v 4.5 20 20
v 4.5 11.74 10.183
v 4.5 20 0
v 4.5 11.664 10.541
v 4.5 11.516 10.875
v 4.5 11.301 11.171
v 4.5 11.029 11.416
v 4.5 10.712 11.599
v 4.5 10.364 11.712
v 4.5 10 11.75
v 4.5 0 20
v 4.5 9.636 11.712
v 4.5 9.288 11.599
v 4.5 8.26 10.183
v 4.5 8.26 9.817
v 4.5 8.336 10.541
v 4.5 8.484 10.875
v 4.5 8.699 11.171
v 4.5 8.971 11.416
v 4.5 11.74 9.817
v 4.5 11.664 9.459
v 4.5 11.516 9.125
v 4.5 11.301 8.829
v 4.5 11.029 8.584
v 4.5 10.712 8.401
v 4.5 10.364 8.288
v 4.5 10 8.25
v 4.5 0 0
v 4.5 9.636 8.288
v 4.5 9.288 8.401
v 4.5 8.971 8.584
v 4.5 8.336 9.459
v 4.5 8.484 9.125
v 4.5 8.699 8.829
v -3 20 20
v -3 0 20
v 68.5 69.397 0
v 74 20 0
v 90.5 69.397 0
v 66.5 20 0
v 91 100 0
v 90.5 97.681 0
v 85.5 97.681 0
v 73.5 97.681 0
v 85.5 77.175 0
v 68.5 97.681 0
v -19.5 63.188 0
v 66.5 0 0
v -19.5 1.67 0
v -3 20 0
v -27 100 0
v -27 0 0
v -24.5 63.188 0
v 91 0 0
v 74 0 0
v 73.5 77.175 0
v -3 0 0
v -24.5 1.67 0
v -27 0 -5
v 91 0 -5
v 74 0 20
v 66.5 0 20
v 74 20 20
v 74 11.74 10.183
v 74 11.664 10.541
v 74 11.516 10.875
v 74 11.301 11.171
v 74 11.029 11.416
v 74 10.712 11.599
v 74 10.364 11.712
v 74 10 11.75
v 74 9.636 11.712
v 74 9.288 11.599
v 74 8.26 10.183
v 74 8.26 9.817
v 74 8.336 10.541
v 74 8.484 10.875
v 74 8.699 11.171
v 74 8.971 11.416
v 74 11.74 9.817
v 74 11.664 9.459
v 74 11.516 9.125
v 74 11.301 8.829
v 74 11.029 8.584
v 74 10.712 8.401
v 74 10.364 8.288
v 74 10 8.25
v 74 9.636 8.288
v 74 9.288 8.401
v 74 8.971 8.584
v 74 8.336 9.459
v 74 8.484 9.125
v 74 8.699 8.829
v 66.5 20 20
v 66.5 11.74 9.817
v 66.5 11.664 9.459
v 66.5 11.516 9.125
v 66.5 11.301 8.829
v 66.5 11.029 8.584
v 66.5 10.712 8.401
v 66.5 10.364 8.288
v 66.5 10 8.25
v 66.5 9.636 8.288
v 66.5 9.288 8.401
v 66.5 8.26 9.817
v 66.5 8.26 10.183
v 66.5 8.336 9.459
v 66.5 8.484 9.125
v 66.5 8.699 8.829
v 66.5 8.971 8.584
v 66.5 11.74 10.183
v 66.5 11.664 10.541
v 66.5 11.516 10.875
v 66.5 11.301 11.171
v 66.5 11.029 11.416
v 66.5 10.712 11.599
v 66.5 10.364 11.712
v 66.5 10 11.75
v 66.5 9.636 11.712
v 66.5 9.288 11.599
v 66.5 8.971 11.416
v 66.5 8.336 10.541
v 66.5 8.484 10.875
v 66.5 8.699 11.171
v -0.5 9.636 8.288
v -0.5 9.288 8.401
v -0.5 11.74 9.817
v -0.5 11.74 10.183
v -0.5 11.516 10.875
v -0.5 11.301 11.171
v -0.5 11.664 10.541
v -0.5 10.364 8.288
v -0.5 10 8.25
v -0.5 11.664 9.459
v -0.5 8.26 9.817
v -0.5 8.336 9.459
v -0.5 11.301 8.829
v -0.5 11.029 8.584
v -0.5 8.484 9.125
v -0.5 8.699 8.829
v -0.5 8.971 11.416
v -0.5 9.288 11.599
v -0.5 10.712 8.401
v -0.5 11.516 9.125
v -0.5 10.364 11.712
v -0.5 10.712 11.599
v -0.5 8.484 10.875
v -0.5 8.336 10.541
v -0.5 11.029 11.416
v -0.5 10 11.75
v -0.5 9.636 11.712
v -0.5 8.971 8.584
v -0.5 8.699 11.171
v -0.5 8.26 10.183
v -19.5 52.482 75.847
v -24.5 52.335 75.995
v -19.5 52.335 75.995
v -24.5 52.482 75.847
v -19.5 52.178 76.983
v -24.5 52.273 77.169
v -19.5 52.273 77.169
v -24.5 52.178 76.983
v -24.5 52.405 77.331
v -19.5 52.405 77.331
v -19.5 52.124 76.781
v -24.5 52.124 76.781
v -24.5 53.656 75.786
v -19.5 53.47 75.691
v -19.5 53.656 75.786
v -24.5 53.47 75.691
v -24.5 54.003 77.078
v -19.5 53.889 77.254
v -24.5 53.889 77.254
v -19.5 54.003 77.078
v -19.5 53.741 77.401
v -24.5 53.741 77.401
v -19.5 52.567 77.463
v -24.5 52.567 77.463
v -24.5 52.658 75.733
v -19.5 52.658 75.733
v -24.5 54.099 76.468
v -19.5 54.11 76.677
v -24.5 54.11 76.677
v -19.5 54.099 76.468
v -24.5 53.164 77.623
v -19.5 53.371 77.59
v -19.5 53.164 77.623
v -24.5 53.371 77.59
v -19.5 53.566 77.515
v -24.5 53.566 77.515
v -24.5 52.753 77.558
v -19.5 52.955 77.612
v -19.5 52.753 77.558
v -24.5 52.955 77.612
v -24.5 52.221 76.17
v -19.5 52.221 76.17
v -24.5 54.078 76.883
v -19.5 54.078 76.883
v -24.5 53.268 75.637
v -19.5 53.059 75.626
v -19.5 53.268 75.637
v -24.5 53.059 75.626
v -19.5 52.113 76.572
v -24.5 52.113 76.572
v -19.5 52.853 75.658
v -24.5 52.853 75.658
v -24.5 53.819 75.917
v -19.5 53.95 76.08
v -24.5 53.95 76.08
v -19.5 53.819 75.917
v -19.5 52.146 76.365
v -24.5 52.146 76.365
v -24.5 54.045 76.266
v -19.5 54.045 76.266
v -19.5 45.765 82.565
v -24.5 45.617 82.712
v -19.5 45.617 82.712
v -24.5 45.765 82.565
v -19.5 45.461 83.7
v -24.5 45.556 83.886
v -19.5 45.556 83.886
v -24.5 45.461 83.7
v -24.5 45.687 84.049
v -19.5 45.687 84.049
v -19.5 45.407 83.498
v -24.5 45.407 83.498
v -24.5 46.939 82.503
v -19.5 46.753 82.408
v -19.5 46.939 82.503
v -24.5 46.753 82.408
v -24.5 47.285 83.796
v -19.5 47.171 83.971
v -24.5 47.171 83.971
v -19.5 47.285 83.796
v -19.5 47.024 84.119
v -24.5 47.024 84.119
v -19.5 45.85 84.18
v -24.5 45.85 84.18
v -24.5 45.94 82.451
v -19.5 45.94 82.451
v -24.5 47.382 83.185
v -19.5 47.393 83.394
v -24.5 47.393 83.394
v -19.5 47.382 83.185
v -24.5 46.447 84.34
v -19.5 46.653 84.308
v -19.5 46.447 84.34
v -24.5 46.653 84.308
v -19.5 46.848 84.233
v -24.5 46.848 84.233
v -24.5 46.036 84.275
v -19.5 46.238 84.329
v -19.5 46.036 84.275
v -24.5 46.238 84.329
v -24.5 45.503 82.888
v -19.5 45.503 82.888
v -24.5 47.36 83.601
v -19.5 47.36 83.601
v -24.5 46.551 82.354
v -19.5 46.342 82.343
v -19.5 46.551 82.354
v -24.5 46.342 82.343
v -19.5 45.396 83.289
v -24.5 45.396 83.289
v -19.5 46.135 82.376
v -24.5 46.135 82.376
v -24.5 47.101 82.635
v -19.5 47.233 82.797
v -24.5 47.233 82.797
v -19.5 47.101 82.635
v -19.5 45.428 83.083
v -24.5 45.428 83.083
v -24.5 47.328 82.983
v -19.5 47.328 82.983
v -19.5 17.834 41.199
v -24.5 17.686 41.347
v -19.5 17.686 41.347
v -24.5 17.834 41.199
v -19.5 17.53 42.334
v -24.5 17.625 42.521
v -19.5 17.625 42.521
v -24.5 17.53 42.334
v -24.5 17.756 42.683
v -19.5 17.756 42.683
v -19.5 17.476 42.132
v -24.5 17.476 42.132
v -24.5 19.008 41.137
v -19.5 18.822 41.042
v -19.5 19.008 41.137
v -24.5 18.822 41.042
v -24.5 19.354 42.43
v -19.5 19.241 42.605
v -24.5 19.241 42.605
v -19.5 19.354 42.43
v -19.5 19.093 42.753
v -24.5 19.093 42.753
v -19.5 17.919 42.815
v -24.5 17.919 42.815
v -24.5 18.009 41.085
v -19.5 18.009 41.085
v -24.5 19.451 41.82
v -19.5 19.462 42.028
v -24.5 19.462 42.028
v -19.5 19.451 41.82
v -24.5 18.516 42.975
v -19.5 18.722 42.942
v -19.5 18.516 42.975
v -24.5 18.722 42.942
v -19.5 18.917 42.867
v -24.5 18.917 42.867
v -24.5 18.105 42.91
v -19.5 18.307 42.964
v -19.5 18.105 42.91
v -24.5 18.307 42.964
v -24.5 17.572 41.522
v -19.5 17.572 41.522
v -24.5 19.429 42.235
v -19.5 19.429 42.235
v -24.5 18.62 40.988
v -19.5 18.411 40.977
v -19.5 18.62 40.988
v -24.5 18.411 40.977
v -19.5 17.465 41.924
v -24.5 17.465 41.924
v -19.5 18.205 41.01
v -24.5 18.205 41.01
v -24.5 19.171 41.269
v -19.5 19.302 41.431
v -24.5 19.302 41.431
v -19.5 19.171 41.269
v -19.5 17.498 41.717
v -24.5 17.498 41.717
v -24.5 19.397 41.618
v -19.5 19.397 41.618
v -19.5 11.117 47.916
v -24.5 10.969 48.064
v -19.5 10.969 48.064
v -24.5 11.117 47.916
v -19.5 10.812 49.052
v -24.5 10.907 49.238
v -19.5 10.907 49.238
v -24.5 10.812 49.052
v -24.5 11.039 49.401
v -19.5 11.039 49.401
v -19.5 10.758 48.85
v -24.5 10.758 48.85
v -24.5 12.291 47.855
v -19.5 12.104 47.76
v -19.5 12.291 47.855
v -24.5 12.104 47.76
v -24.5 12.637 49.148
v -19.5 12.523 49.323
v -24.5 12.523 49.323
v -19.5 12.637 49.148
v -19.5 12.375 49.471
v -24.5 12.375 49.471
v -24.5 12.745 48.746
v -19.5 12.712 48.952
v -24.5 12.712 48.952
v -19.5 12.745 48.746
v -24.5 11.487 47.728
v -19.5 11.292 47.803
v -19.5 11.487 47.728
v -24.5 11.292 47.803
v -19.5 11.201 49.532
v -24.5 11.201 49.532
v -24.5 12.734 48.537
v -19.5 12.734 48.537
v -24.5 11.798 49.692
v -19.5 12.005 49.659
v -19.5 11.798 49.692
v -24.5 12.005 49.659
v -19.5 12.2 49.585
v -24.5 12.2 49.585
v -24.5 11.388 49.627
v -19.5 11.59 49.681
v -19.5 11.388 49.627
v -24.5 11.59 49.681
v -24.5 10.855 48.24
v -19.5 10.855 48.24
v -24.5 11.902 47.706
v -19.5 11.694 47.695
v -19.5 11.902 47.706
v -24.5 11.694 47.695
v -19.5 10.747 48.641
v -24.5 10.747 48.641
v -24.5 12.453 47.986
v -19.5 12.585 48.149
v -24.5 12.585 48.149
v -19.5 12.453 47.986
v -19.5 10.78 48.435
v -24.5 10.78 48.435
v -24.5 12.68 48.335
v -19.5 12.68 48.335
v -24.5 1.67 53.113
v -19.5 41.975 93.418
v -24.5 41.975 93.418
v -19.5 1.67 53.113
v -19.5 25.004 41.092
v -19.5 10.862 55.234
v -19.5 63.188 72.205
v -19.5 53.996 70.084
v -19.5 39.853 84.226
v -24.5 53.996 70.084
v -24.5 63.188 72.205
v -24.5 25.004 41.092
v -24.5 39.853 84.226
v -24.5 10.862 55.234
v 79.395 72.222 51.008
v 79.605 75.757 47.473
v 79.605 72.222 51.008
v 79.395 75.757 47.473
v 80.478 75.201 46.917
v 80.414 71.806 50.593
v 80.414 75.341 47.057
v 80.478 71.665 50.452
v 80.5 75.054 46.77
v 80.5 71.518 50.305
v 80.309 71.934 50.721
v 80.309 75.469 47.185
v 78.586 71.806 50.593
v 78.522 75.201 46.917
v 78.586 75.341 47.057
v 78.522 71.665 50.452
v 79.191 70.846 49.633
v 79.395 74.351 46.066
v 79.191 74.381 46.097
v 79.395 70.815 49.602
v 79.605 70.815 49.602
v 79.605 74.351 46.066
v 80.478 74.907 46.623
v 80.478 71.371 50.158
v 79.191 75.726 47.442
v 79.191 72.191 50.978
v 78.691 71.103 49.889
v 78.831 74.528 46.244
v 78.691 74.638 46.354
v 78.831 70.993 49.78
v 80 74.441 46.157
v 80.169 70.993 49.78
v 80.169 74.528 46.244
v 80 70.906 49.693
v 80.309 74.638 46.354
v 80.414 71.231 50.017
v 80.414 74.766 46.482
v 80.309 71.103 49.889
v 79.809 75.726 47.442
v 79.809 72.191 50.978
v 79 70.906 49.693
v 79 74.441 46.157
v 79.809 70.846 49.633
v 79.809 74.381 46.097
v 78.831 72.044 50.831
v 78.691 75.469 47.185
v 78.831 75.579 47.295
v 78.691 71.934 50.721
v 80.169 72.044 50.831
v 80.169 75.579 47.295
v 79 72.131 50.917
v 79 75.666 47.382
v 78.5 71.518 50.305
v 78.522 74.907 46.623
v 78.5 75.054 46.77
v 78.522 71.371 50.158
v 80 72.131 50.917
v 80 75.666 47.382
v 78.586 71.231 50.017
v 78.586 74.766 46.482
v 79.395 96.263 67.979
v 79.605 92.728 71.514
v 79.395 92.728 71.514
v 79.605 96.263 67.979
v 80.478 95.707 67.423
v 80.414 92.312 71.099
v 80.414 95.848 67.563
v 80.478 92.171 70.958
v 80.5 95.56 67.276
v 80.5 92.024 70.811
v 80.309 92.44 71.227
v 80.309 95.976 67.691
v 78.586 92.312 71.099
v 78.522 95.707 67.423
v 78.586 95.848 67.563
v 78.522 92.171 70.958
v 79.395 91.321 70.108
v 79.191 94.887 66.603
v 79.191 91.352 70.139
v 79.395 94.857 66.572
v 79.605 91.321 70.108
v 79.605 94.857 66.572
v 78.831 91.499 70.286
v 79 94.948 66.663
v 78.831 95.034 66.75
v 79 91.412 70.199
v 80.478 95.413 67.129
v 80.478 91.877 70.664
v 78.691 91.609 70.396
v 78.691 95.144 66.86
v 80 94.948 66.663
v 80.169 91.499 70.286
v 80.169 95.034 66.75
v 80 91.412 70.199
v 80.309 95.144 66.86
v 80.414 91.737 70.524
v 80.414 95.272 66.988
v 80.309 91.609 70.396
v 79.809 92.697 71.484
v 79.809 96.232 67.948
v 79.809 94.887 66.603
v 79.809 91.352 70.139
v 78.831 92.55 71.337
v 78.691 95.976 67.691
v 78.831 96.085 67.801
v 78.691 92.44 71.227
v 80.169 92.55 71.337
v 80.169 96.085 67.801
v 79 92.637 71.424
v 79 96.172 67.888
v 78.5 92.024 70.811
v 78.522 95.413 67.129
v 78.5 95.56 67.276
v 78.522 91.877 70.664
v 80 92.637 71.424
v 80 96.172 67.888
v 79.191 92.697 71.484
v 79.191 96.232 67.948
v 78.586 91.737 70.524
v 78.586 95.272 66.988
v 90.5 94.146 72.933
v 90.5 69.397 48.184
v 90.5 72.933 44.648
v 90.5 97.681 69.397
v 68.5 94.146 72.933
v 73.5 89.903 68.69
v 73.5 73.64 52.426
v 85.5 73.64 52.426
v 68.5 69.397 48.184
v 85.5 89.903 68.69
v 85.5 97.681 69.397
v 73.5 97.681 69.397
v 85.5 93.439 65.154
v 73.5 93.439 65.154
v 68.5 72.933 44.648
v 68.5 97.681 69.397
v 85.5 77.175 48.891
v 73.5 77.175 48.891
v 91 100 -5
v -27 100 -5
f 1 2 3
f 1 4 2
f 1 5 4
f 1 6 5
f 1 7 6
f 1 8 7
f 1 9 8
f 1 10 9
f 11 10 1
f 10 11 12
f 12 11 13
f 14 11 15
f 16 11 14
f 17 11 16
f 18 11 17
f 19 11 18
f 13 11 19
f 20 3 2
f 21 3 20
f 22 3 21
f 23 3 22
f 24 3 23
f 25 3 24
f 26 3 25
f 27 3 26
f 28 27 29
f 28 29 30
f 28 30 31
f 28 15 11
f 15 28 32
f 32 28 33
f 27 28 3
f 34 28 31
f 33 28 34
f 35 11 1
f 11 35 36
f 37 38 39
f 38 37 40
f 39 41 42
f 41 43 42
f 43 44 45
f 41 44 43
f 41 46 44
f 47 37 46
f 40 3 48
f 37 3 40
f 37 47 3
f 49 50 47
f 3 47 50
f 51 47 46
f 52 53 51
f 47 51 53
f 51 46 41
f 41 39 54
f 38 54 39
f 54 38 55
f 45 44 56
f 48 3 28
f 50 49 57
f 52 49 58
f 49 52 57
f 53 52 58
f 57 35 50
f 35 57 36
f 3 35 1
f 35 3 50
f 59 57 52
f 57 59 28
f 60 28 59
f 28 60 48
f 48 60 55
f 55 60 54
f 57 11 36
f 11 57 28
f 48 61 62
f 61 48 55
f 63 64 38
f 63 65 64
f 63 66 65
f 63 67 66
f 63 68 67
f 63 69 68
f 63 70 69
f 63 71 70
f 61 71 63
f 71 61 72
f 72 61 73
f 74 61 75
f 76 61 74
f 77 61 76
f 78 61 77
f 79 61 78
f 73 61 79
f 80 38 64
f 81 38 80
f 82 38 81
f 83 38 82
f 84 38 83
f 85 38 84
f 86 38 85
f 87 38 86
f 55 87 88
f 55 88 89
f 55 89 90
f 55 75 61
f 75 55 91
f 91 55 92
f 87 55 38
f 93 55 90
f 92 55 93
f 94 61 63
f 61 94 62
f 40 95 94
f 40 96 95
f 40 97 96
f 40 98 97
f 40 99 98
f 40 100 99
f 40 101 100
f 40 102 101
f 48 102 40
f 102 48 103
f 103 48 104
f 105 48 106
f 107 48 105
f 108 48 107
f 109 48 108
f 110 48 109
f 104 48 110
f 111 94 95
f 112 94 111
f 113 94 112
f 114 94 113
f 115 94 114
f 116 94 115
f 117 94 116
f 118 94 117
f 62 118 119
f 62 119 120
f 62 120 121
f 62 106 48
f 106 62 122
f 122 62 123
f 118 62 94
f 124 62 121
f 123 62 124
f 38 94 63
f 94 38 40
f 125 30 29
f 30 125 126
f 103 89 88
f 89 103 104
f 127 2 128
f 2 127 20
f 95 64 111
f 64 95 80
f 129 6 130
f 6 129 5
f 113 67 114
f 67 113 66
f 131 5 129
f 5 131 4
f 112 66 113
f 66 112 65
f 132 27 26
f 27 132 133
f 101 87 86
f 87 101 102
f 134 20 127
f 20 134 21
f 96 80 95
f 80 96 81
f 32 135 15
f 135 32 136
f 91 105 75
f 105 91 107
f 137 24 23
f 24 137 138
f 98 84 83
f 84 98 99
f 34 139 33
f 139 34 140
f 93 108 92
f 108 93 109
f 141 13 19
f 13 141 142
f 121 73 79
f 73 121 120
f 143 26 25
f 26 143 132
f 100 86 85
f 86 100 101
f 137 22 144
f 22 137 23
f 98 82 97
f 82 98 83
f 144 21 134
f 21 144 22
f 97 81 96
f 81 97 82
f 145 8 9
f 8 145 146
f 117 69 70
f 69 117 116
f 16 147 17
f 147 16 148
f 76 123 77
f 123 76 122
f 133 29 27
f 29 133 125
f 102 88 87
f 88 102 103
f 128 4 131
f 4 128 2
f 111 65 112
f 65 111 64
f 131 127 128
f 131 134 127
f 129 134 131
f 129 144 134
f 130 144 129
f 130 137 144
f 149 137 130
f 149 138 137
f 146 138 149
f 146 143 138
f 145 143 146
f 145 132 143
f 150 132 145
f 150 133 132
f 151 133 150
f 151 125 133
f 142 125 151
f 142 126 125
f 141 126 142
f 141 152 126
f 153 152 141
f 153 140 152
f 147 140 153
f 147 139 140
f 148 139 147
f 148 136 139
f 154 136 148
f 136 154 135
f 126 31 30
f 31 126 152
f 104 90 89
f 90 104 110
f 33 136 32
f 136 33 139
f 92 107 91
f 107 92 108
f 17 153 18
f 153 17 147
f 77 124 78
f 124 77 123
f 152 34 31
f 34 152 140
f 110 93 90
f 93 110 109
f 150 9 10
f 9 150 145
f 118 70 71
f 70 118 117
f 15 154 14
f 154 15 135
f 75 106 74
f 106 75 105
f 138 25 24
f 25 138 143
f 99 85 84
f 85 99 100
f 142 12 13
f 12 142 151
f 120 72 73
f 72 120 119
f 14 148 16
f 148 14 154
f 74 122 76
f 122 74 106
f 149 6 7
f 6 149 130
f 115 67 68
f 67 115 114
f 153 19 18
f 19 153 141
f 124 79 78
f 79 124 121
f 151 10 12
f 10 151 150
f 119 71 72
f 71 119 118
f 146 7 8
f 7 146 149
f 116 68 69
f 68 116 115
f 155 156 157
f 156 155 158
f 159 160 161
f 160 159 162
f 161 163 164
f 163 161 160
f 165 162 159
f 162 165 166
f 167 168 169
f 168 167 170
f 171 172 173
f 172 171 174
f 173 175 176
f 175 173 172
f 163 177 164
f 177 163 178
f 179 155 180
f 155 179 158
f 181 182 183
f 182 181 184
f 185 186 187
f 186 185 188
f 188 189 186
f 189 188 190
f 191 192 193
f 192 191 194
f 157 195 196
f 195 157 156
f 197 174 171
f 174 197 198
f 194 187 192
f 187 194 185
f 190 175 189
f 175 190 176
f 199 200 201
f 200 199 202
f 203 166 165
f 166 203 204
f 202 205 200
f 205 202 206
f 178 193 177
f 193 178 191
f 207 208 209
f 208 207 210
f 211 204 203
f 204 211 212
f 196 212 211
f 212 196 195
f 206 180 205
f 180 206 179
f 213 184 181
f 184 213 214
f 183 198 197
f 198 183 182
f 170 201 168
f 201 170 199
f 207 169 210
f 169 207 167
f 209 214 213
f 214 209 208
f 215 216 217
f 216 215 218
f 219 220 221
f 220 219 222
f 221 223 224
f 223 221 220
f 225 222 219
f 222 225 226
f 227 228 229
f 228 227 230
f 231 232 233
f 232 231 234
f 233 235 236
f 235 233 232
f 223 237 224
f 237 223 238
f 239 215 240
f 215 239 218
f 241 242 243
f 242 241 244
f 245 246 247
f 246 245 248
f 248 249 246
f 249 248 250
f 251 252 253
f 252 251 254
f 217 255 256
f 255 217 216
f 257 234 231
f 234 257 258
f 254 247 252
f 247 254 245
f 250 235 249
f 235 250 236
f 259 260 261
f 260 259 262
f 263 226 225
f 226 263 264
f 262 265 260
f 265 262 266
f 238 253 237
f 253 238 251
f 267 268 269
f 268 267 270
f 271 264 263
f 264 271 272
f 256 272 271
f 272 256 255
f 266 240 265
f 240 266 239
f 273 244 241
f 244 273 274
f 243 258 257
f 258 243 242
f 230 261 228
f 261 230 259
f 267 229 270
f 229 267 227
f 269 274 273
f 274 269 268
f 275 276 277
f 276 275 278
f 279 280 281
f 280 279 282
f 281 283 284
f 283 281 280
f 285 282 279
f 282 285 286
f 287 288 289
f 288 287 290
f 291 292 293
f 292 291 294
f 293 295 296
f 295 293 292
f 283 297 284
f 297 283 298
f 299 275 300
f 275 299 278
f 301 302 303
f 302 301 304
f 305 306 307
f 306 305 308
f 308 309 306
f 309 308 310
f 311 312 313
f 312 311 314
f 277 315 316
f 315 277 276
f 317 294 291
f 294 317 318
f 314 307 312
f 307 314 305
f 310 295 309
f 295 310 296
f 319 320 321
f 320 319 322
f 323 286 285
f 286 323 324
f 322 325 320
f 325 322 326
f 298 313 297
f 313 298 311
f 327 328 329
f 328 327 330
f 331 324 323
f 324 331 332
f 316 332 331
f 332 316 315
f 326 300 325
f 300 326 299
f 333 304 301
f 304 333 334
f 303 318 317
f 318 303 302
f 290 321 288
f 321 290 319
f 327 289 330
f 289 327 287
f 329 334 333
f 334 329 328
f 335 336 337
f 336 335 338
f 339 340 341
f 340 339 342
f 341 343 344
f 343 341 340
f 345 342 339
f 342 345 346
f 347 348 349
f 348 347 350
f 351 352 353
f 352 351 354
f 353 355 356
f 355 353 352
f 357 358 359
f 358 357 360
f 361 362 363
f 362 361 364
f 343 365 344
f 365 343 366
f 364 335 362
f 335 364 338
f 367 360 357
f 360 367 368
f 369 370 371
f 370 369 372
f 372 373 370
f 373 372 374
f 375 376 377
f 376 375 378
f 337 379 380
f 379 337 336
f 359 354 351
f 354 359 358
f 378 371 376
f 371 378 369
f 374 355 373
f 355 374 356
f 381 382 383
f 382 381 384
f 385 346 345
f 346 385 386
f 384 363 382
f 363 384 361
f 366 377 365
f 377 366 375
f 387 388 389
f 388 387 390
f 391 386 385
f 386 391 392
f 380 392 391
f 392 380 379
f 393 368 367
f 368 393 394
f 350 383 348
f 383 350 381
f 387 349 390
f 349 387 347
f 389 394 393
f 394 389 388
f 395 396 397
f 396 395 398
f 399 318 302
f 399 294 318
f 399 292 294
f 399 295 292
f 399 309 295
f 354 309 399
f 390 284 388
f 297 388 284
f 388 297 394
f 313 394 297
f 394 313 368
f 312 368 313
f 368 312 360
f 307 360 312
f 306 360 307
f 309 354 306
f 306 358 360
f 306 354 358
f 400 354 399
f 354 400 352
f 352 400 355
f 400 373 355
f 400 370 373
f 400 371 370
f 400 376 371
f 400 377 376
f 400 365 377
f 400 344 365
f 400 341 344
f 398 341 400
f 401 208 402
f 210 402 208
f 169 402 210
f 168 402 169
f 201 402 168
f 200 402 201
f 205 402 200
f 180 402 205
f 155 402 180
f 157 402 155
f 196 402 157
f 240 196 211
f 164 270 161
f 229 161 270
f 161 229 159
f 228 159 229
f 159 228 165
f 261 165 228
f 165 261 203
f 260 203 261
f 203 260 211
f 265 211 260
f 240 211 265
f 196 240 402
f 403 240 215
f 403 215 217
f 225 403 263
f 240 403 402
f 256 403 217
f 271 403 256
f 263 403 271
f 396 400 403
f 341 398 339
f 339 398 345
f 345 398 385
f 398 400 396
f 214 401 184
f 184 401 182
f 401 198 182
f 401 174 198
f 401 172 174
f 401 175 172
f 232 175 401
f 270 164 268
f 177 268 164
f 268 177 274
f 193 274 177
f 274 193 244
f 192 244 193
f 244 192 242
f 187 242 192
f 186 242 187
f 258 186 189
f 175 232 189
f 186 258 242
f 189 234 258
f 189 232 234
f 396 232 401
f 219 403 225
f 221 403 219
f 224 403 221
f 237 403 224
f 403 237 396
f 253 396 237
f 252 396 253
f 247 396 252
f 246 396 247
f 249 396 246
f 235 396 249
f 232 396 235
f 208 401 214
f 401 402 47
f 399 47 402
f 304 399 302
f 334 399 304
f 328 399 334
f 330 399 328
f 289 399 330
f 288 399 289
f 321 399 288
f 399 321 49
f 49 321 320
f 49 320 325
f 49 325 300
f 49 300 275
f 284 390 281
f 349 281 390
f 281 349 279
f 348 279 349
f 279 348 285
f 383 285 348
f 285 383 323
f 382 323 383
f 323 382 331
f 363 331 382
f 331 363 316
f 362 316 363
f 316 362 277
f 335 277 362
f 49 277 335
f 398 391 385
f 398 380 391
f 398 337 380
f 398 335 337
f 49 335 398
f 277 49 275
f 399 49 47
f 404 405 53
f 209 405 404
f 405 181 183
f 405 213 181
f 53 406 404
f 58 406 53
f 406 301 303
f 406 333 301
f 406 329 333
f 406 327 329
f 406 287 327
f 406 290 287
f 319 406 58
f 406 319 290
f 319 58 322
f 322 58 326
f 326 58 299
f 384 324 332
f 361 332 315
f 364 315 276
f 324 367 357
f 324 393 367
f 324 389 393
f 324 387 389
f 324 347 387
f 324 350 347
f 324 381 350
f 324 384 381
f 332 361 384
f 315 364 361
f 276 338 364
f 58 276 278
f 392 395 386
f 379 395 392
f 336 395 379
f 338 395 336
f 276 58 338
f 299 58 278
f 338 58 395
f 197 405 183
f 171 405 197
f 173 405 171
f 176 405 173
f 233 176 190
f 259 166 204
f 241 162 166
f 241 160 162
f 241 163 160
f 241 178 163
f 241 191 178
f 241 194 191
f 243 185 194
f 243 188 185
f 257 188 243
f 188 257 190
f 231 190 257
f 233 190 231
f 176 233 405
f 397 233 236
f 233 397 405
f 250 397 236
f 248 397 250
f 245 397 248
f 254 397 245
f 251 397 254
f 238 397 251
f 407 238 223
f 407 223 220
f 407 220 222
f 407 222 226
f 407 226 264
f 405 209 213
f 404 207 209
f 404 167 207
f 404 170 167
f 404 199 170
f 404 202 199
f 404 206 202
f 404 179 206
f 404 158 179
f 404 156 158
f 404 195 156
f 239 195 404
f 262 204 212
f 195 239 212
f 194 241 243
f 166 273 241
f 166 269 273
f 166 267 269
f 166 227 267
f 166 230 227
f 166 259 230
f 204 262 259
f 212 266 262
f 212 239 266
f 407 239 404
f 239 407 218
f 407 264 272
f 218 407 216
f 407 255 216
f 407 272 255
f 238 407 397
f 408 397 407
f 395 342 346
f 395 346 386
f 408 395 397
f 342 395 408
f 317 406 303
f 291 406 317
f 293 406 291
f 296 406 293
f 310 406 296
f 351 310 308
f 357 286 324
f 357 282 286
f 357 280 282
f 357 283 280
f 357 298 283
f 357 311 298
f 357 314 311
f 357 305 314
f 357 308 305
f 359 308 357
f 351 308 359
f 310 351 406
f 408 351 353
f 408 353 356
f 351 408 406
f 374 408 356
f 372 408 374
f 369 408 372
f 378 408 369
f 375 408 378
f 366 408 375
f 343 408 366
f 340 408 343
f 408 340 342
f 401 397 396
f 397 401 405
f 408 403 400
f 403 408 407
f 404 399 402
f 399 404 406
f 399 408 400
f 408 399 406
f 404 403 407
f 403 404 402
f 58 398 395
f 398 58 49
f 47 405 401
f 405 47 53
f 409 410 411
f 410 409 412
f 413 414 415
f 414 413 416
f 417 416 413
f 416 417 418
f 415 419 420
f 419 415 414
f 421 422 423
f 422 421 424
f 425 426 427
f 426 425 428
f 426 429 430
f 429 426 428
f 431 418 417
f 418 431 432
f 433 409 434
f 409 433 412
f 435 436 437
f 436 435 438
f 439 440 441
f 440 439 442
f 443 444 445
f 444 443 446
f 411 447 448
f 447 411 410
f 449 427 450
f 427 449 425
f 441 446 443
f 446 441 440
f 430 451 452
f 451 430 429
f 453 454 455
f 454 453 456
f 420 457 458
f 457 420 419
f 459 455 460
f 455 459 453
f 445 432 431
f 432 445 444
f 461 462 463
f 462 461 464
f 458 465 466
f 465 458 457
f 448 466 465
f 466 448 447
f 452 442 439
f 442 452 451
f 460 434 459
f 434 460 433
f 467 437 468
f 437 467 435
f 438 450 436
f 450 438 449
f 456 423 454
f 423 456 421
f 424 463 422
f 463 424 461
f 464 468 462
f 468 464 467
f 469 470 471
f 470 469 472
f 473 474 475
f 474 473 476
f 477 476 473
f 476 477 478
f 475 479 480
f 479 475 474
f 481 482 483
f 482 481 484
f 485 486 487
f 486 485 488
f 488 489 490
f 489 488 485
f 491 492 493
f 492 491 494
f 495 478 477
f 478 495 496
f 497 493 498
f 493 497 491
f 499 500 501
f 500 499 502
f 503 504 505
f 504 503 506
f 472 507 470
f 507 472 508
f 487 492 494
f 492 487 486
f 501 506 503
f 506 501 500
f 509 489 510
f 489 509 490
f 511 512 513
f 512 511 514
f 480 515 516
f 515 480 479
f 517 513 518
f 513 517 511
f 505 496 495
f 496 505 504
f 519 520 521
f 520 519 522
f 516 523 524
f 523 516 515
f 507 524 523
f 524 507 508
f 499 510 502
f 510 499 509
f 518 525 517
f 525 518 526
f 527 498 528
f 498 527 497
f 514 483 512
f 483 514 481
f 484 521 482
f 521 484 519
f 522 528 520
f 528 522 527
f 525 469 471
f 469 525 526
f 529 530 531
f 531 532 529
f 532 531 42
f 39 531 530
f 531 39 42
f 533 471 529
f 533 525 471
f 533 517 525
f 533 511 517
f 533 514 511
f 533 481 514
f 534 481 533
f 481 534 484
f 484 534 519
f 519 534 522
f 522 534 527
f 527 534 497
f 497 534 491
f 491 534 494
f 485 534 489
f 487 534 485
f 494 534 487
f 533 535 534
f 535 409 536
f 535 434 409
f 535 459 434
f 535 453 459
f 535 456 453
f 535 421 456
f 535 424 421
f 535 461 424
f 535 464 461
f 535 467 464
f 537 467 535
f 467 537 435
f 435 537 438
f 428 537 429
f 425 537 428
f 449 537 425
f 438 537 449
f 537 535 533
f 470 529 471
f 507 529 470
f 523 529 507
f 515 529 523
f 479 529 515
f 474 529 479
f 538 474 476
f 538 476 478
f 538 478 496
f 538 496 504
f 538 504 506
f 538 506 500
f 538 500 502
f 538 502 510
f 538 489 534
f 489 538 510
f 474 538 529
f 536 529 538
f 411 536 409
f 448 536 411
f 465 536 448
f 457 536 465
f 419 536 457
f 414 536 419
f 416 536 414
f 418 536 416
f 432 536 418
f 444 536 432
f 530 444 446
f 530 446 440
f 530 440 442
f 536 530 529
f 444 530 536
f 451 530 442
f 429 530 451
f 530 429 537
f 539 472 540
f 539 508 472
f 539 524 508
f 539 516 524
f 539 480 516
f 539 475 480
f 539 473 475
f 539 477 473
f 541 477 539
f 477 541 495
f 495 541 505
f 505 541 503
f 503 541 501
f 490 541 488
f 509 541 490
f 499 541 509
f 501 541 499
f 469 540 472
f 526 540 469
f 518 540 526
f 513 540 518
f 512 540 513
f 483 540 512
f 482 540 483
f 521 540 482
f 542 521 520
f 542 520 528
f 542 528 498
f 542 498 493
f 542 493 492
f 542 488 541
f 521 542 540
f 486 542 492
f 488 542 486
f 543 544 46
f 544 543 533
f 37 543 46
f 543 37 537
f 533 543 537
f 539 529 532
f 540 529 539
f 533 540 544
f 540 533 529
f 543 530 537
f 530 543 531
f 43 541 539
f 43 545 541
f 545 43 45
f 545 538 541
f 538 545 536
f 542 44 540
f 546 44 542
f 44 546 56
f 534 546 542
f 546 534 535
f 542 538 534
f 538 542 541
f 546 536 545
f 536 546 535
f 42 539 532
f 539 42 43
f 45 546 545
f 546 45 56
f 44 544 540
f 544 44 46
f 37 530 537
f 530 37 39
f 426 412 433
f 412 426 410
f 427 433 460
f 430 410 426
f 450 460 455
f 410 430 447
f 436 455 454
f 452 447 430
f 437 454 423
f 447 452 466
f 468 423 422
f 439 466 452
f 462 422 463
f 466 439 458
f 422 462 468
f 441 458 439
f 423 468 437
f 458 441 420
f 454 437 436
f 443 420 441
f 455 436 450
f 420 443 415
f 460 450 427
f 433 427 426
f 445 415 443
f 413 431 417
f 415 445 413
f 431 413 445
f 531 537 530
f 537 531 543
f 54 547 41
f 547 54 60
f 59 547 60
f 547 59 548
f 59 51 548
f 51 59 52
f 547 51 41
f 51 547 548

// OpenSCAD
// file: utilities.scad
include <constants.scad>;

module bolt(diameter, depth) {
    translate([0, 0, depth/2]) union() {
        cube([diameter/1.75, diameter, depth], center=true);
        rotate([0, 0, 60]) cube([diameter/1.75, diameter, depth], center=true);
        rotate([0, 0, 120]) cube([diameter/1.75, diameter, depth], center=true);
    }
}

module roundedBox(width, height, radius) {
    union() {
        translate([radius, 0]) square([width-2*radius, height]);
        translate([0, radius]) square([width, height-2*radius]);
        translate([radius, radius]) circle(r=radius, $fs=cylinder_precision);
        translate([width-radius, radius]) circle(r=radius, $fs=cylinder_precision);
        translate([radius, height-radius]) circle(r=radius, $fs=cylinder_precision);
        translate([width-radius, height-radius]) circle(r=radius, $fs=cylinder_precision);
    }
}

first_mounting_hole_left = (arm_width - mounting_holes_spacing * (mounting_holes-1)) / 2;
arm_housing_space = arm_thickness+hinge_arm_housing_allowance;
holder_thickness = (hinge_thickness-arm_housing_space)/2;
base_distance_to_axle_center = hinge_thickness / 2 + base_hinge_allowance;
small_servo_holder_base_to_arm_distance = small_servo_axle_top_distance_from_holder_base+servo_holder_thickness;
big_servo_holder_base_to_arm_distance = big_servo_axle_top_distance_from_holder_base+servo_holder_thickness;
small_servo_holder_width = small_servo_width + servo_holder_thickness*2;
big_servo_holder_width = big_servo_width + servo_holder_thickness*2;
spring_hook_hole_distance_from_arm = spring_hook_width - spring_hook_height / 2;
// file: constants.scad
// ================================================
// structural parameters (can play with these)
//

// arm
arm_length = 200;
arm_width = 60;
arm_thickness = 4;
arm_ready_degrees = 45;

// hand
palm_width = 100;

// spring hook
spring_hook_distance = 120;
spring_hook_width = 10;
spring_hook_height = 8;
spring_hook_hole_diameter = 3;

// mounting holes
mounting_holes = 3;
mounting_holes_spacing = 18; // center to center
mounting_holes_distance_from_bottom = 10; // border to center

// screws and bolts
screw_diameter = 4; // TODO: add some allowance for the 3D printer
screw_head_diameter = 7; // probably here too...
screw_bolt_diameter = 7; // TODO: add some allowance for the 3D printer

// hinge
hinge_thickness = 16;
hinge_arm_housing_allowance = 1;
hinge_axle_housing_allowance = 0.5;

// axle
axle_diameter = 3;
axle_length = 71;

// base
base_thickness = 5;
base_length = 100;
base_hinge_allowance = 2;
base_arm_horizontal_gap = 2;
base_axle_mount_allowance = 0.5;
base_axle_side_thickness = 3;

// small servo
small_servo_width = 12;
small_servo_length = 23;
small_servo_screws = 1; // number of screws on each side
small_servo_screw_diameter = 2;
small_servo_screws_distance_from_servo = 3; // from center
small_servo_distance_between_screws = 11;
small_servo_axle_distance_from_front = 5;
small_servo_axle_top_distance_from_holder_base = 17;

// big servo
big_servo_width = 20;
big_servo_length = 41;
big_servo_screws = 2; // number of screws on each side
big_servo_screw_diameter = 2; // TODO
big_servo_screws_distance_from_servo = 4; // from center
big_servo_distance_between_screws = 9.5;
big_servo_axle_distance_from_front = 10;
big_servo_axle_top_distance_from_holder_base = 15;

// servo holder
servo_holder_thickness = 5;

// spring servo arm
spring_servo_arm_width = 8;
spring_servo_arm_spring_hole_distance = 25;
spring_servo_arm_screw_diameter = 3;
spring_servo_arm_hole_diameter = 5;
spring_servo_arm_distance_between_screws = 10;
spring_servo_arm_thickness = 4;

// spring servo
spring_servo_distance_from_axle = 70;

// holder servo
holder_servo_gap_from_arm = 3;
holder_servo_distance = 80;

// holder servo arm
holder_servo_arm_spring_hole_distance = 16;

// ================================================
// aesthetic parameters (best not to change)
//
fingers_gap = palm_width / 30;
palm_height = palm_width / 6 * 5;
rounding_radius = palm_width / 6;
finger_length_perc = [1.25, 1.3, 1.4, 1.35, 1.2];


// ================================================
// technical parameters for rendering
//
cylinder_precision = 0.05;
abbundance_for_subtraction = 0.01;
// main file
include <constants.scad>;
include <utilities.scad>;

spring_servo_holder_degree = arm_ready_degrees/2;

axle_side_exceedance = (axle_length - arm_width) / 2;
base_side_width = base_axle_side_thickness + axle_side_exceedance - base_arm_horizontal_gap/2;
axle_hole_diameter = axle_diameter+base_axle_mount_allowance;
base_side_height = base_distance_to_axle_center * 2;


small_servo_holder_length = small_servo_length + small_servo_screws_distance_from_servo*4;
big_servo_holder_length = big_servo_length + big_servo_screws_distance_from_servo*4;
small_first_screw_offset = (small_servo_holder_width - small_servo_distance_between_screws*(small_servo_screws-1)) / 2;
big_first_screw_offset = (big_servo_holder_width - big_servo_distance_between_screws*(big_servo_screws-1)) / 2;
perforation_height = servo_holder_thickness + abbundance_for_subtraction*2;
small_axle_height = servo_holder_thickness + small_servo_axle_top_distance_from_holder_base;
big_axle_height = servo_holder_thickness + big_servo_axle_top_distance_from_holder_base;


module base() {
    difference() {
        // side axle holders
        union() {
            translate([-base_axle_side_thickness, 0, 0]) cube([base_side_width, base_side_height, base_side_height]);
            translate([axle_length - axle_side_exceedance + base_arm_horizontal_gap/2, 0, 0]) cube([base_side_width, base_side_height, base_side_height]);
        }
        // axle housing
        translate([-base_axle_mount_allowance, base_distance_to_axle_center, base_distance_to_axle_center]) rotate([0, 90, 0]) cylinder(r=axle_hole_diameter/2, h=axle_length + 2*base_axle_mount_allowance + axle_side_exceedance + abbundance_for_subtraction, $fs=cylinder_precision);
    }

    // base
    extra_width_for_spring_servo = spring_servo_arm_thickness/2 + small_servo_axle_top_distance_from_holder_base + servo_holder_thickness;
    translate([-base_axle_side_thickness - extra_width_for_spring_servo, 0, -base_thickness])
        cube([base_axle_side_thickness*2 + axle_length + extra_width_for_spring_servo + small_servo_width + servo_holder_thickness, base_length, base_thickness]);

    // spring servo holder
    springServoHolder() children(0);

    // stand of the spring servo holder
    difference() {
        linear_extrude(height=spring_servo_distance_from_axle*2) projection() springServoHolder();
        placeSpringServoHolder() {
            bigServoHolder();
            translate([-(big_servo_holder_width/2), -(big_servo_screws_distance_from_servo*2 + big_servo_axle_distance_from_front), -big_servo_holder_base_to_arm_distance]) {
                translate([0, -spring_servo_distance_from_axle, -servo_holder_thickness]) cube([big_servo_holder_width + spring_servo_distance_from_axle, big_servo_holder_length + spring_servo_distance_from_axle, servo_holder_thickness*3]);
            }
        }
    }

    // holder servo
    holderServoHolder() children(1);

    // stand of the holder servo holder
    difference() {
        linear_extrude(height=spring_servo_distance_from_axle*2) projection()
        placeHolderServoHolder() {
            translate([-(small_servo_holder_width/2), -(small_servo_screws_distance_from_servo*2 + small_servo_axle_distance_from_front), -small_servo_holder_base_to_arm_distance]) {
                difference() {
                    cube([small_servo_holder_width, small_servo_holder_length, servo_holder_thickness]);
                    // hole for servo
                    translate([servo_holder_thickness, small_servo_screws_distance_from_servo*2, -abbundance_for_subtraction]) cube([small_servo_width, small_servo_length*2, perforation_height]);
                }
            }
        }
        placeHolderServoHolder() {
            translate([-(small_servo_holder_width/2), -(small_servo_screws_distance_from_servo*2 + small_servo_axle_distance_from_front), -small_servo_holder_base_to_arm_distance]) {
                translate([-small_servo_holder_width, 0, 0]) cube([small_servo_holder_width*3, spring_servo_distance_from_axle*2, spring_servo_distance_from_axle*2]);
            }
        }
    }
}

module placeHolderServoHolder() {
    translate([(axle_length - arm_width)/2 + arm_width + small_servo_holder_width/2 + holder_servo_gap_from_arm, base_distance_to_axle_center, base_distance_to_axle_center]) {
        rotate([-arm_ready_degrees, 0, 0])
        translate([0, -arm_thickness/2, holder_servo_distance])
        rotate([90, 0, 0]) {
            children();
        }
    }
}

module holderServoHolder() {
    placeHolderServoHolder() {
        smallServoHolder();
        children();
    }
}

module placeSpringServoHolder() {
    rotate([-spring_servo_holder_degree, 0, 0])
    translate([0, 0, spring_servo_distance_from_axle])
    translate([(axle_length - arm_width)/2 - spring_hook_hole_distance_from_arm - spring_servo_arm_thickness, base_distance_to_axle_center, base_distance_to_axle_center]) {
        rotate([-spring_servo_holder_degree-90, 0, 0])
        rotate([0, 90, 0]) {
            children();
        }
    }
}

module springServoHolder() {
    placeSpringServoHolder() {
        bigServoHolder();
        children();
    }
}

module smallServoHolder() {
    translate([-(small_servo_holder_width/2), -(small_servo_screws_distance_from_servo*2 + small_servo_axle_distance_from_front), -small_servo_holder_base_to_arm_distance]) {
        difference() {
            cube([small_servo_holder_width, small_servo_holder_length, servo_holder_thickness]);
            // hole for servo
            translate([servo_holder_thickness, small_servo_screws_distance_from_servo*2, -abbundance_for_subtraction]) cube([small_servo_width, small_servo_length, perforation_height]);
            // holes for screws
            for (yOffset=[small_servo_screws_distance_from_servo, small_servo_screws_distance_from_servo*3 + small_servo_length]) {
                for (screwIdx=[0 : small_servo_screws-1]) {
                    translate([small_first_screw_offset + small_servo_distance_between_screws*screwIdx, yOffset, 0]) {
                        translate([0, 0, -abbundance_for_subtraction]) cylinder(r=small_servo_screw_diameter/2, h=perforation_height, $fs=cylinder_precision);
                    }
                }
            }
        }
    }
}

module bigServoHolder() {
    translate([-(big_servo_holder_width/2), -(big_servo_screws_distance_from_servo*2 + big_servo_axle_distance_from_front), -big_servo_holder_base_to_arm_distance]) {
        difference() {
            cube([big_servo_holder_width, big_servo_holder_length, servo_holder_thickness]);
            // hole for servo
            translate([servo_holder_thickness, big_servo_screws_distance_from_servo*2, -abbundance_for_subtraction]) cube([big_servo_width, big_servo_length, perforation_height]);
            // holes for screws
            for (yOffset=[big_servo_screws_distance_from_servo, big_servo_screws_distance_from_servo*3 + big_servo_length]) {
                for (screwIdx=[0 : big_servo_screws-1]) {
                    translate([big_first_screw_offset + big_servo_distance_between_screws*screwIdx, yOffset, 0]) {
                        translate([0, 0, -abbundance_for_subtraction]) cylinder(r=big_servo_screw_diameter/2, h=perforation_height, $fs=cylinder_precision);
                    }
                }
            }
        }
    }
}


module servoArm2D(springHoleDistance, springHole) {
    translate([-spring_servo_arm_distance_between_screws/2 - spring_servo_arm_width/2, -spring_servo_arm_width/2]) {
        difference() {
            roundedBox(spring_servo_arm_width + springHoleDistance + spring_servo_arm_distance_between_screws/2, spring_servo_arm_width, spring_servo_arm_width/2);
            // first servo hole
            translate([spring_servo_arm_width/2, spring_servo_arm_width/2]) circle(r = spring_servo_arm_screw_diameter/2, $fs=cylinder_precision);
            // second servo hole
            translate([spring_servo_arm_width/2 + spring_servo_arm_distance_between_screws, spring_servo_arm_width/2]) circle(r = spring_servo_arm_screw_diameter/2, $fs=cylinder_precision);
            // spring servo hole
            if (springHole) {
                translate([spring_servo_arm_width/2 + spring_servo_arm_distance_between_screws/2 + springHoleDistance, spring_servo_arm_width/2]) circle(r = spring_servo_arm_hole_diameter/2, $fs=cylinder_precision);
            }
        }
    }
}

module springServoArm2D() {
    servoArm2D(springHoleDistance = spring_servo_arm_spring_hole_distance, springHole = true);
}

module springServoArm3D() {
    linear_extrude(height=spring_servo_arm_thickness) springServoArm2D();
}

module rotatedSpringServoArm(armDegrees) {
    rotate([0, 0, armDegrees+90]) springServoArm3D();
}


module holderServoArm2D() {
    servoArm2D(springHoleDistance = holder_servo_arm_spring_hole_distance, springHole = false);
}

module holderServoArm3D() {
    linear_extrude(height=spring_servo_arm_thickness) holderServoArm2D();
}

module rotatedHolderServoArm(armDegrees) {
    rotate([0, 0, armDegrees+90]) holderServoArm3D();
}


// --------------------------------

base();
